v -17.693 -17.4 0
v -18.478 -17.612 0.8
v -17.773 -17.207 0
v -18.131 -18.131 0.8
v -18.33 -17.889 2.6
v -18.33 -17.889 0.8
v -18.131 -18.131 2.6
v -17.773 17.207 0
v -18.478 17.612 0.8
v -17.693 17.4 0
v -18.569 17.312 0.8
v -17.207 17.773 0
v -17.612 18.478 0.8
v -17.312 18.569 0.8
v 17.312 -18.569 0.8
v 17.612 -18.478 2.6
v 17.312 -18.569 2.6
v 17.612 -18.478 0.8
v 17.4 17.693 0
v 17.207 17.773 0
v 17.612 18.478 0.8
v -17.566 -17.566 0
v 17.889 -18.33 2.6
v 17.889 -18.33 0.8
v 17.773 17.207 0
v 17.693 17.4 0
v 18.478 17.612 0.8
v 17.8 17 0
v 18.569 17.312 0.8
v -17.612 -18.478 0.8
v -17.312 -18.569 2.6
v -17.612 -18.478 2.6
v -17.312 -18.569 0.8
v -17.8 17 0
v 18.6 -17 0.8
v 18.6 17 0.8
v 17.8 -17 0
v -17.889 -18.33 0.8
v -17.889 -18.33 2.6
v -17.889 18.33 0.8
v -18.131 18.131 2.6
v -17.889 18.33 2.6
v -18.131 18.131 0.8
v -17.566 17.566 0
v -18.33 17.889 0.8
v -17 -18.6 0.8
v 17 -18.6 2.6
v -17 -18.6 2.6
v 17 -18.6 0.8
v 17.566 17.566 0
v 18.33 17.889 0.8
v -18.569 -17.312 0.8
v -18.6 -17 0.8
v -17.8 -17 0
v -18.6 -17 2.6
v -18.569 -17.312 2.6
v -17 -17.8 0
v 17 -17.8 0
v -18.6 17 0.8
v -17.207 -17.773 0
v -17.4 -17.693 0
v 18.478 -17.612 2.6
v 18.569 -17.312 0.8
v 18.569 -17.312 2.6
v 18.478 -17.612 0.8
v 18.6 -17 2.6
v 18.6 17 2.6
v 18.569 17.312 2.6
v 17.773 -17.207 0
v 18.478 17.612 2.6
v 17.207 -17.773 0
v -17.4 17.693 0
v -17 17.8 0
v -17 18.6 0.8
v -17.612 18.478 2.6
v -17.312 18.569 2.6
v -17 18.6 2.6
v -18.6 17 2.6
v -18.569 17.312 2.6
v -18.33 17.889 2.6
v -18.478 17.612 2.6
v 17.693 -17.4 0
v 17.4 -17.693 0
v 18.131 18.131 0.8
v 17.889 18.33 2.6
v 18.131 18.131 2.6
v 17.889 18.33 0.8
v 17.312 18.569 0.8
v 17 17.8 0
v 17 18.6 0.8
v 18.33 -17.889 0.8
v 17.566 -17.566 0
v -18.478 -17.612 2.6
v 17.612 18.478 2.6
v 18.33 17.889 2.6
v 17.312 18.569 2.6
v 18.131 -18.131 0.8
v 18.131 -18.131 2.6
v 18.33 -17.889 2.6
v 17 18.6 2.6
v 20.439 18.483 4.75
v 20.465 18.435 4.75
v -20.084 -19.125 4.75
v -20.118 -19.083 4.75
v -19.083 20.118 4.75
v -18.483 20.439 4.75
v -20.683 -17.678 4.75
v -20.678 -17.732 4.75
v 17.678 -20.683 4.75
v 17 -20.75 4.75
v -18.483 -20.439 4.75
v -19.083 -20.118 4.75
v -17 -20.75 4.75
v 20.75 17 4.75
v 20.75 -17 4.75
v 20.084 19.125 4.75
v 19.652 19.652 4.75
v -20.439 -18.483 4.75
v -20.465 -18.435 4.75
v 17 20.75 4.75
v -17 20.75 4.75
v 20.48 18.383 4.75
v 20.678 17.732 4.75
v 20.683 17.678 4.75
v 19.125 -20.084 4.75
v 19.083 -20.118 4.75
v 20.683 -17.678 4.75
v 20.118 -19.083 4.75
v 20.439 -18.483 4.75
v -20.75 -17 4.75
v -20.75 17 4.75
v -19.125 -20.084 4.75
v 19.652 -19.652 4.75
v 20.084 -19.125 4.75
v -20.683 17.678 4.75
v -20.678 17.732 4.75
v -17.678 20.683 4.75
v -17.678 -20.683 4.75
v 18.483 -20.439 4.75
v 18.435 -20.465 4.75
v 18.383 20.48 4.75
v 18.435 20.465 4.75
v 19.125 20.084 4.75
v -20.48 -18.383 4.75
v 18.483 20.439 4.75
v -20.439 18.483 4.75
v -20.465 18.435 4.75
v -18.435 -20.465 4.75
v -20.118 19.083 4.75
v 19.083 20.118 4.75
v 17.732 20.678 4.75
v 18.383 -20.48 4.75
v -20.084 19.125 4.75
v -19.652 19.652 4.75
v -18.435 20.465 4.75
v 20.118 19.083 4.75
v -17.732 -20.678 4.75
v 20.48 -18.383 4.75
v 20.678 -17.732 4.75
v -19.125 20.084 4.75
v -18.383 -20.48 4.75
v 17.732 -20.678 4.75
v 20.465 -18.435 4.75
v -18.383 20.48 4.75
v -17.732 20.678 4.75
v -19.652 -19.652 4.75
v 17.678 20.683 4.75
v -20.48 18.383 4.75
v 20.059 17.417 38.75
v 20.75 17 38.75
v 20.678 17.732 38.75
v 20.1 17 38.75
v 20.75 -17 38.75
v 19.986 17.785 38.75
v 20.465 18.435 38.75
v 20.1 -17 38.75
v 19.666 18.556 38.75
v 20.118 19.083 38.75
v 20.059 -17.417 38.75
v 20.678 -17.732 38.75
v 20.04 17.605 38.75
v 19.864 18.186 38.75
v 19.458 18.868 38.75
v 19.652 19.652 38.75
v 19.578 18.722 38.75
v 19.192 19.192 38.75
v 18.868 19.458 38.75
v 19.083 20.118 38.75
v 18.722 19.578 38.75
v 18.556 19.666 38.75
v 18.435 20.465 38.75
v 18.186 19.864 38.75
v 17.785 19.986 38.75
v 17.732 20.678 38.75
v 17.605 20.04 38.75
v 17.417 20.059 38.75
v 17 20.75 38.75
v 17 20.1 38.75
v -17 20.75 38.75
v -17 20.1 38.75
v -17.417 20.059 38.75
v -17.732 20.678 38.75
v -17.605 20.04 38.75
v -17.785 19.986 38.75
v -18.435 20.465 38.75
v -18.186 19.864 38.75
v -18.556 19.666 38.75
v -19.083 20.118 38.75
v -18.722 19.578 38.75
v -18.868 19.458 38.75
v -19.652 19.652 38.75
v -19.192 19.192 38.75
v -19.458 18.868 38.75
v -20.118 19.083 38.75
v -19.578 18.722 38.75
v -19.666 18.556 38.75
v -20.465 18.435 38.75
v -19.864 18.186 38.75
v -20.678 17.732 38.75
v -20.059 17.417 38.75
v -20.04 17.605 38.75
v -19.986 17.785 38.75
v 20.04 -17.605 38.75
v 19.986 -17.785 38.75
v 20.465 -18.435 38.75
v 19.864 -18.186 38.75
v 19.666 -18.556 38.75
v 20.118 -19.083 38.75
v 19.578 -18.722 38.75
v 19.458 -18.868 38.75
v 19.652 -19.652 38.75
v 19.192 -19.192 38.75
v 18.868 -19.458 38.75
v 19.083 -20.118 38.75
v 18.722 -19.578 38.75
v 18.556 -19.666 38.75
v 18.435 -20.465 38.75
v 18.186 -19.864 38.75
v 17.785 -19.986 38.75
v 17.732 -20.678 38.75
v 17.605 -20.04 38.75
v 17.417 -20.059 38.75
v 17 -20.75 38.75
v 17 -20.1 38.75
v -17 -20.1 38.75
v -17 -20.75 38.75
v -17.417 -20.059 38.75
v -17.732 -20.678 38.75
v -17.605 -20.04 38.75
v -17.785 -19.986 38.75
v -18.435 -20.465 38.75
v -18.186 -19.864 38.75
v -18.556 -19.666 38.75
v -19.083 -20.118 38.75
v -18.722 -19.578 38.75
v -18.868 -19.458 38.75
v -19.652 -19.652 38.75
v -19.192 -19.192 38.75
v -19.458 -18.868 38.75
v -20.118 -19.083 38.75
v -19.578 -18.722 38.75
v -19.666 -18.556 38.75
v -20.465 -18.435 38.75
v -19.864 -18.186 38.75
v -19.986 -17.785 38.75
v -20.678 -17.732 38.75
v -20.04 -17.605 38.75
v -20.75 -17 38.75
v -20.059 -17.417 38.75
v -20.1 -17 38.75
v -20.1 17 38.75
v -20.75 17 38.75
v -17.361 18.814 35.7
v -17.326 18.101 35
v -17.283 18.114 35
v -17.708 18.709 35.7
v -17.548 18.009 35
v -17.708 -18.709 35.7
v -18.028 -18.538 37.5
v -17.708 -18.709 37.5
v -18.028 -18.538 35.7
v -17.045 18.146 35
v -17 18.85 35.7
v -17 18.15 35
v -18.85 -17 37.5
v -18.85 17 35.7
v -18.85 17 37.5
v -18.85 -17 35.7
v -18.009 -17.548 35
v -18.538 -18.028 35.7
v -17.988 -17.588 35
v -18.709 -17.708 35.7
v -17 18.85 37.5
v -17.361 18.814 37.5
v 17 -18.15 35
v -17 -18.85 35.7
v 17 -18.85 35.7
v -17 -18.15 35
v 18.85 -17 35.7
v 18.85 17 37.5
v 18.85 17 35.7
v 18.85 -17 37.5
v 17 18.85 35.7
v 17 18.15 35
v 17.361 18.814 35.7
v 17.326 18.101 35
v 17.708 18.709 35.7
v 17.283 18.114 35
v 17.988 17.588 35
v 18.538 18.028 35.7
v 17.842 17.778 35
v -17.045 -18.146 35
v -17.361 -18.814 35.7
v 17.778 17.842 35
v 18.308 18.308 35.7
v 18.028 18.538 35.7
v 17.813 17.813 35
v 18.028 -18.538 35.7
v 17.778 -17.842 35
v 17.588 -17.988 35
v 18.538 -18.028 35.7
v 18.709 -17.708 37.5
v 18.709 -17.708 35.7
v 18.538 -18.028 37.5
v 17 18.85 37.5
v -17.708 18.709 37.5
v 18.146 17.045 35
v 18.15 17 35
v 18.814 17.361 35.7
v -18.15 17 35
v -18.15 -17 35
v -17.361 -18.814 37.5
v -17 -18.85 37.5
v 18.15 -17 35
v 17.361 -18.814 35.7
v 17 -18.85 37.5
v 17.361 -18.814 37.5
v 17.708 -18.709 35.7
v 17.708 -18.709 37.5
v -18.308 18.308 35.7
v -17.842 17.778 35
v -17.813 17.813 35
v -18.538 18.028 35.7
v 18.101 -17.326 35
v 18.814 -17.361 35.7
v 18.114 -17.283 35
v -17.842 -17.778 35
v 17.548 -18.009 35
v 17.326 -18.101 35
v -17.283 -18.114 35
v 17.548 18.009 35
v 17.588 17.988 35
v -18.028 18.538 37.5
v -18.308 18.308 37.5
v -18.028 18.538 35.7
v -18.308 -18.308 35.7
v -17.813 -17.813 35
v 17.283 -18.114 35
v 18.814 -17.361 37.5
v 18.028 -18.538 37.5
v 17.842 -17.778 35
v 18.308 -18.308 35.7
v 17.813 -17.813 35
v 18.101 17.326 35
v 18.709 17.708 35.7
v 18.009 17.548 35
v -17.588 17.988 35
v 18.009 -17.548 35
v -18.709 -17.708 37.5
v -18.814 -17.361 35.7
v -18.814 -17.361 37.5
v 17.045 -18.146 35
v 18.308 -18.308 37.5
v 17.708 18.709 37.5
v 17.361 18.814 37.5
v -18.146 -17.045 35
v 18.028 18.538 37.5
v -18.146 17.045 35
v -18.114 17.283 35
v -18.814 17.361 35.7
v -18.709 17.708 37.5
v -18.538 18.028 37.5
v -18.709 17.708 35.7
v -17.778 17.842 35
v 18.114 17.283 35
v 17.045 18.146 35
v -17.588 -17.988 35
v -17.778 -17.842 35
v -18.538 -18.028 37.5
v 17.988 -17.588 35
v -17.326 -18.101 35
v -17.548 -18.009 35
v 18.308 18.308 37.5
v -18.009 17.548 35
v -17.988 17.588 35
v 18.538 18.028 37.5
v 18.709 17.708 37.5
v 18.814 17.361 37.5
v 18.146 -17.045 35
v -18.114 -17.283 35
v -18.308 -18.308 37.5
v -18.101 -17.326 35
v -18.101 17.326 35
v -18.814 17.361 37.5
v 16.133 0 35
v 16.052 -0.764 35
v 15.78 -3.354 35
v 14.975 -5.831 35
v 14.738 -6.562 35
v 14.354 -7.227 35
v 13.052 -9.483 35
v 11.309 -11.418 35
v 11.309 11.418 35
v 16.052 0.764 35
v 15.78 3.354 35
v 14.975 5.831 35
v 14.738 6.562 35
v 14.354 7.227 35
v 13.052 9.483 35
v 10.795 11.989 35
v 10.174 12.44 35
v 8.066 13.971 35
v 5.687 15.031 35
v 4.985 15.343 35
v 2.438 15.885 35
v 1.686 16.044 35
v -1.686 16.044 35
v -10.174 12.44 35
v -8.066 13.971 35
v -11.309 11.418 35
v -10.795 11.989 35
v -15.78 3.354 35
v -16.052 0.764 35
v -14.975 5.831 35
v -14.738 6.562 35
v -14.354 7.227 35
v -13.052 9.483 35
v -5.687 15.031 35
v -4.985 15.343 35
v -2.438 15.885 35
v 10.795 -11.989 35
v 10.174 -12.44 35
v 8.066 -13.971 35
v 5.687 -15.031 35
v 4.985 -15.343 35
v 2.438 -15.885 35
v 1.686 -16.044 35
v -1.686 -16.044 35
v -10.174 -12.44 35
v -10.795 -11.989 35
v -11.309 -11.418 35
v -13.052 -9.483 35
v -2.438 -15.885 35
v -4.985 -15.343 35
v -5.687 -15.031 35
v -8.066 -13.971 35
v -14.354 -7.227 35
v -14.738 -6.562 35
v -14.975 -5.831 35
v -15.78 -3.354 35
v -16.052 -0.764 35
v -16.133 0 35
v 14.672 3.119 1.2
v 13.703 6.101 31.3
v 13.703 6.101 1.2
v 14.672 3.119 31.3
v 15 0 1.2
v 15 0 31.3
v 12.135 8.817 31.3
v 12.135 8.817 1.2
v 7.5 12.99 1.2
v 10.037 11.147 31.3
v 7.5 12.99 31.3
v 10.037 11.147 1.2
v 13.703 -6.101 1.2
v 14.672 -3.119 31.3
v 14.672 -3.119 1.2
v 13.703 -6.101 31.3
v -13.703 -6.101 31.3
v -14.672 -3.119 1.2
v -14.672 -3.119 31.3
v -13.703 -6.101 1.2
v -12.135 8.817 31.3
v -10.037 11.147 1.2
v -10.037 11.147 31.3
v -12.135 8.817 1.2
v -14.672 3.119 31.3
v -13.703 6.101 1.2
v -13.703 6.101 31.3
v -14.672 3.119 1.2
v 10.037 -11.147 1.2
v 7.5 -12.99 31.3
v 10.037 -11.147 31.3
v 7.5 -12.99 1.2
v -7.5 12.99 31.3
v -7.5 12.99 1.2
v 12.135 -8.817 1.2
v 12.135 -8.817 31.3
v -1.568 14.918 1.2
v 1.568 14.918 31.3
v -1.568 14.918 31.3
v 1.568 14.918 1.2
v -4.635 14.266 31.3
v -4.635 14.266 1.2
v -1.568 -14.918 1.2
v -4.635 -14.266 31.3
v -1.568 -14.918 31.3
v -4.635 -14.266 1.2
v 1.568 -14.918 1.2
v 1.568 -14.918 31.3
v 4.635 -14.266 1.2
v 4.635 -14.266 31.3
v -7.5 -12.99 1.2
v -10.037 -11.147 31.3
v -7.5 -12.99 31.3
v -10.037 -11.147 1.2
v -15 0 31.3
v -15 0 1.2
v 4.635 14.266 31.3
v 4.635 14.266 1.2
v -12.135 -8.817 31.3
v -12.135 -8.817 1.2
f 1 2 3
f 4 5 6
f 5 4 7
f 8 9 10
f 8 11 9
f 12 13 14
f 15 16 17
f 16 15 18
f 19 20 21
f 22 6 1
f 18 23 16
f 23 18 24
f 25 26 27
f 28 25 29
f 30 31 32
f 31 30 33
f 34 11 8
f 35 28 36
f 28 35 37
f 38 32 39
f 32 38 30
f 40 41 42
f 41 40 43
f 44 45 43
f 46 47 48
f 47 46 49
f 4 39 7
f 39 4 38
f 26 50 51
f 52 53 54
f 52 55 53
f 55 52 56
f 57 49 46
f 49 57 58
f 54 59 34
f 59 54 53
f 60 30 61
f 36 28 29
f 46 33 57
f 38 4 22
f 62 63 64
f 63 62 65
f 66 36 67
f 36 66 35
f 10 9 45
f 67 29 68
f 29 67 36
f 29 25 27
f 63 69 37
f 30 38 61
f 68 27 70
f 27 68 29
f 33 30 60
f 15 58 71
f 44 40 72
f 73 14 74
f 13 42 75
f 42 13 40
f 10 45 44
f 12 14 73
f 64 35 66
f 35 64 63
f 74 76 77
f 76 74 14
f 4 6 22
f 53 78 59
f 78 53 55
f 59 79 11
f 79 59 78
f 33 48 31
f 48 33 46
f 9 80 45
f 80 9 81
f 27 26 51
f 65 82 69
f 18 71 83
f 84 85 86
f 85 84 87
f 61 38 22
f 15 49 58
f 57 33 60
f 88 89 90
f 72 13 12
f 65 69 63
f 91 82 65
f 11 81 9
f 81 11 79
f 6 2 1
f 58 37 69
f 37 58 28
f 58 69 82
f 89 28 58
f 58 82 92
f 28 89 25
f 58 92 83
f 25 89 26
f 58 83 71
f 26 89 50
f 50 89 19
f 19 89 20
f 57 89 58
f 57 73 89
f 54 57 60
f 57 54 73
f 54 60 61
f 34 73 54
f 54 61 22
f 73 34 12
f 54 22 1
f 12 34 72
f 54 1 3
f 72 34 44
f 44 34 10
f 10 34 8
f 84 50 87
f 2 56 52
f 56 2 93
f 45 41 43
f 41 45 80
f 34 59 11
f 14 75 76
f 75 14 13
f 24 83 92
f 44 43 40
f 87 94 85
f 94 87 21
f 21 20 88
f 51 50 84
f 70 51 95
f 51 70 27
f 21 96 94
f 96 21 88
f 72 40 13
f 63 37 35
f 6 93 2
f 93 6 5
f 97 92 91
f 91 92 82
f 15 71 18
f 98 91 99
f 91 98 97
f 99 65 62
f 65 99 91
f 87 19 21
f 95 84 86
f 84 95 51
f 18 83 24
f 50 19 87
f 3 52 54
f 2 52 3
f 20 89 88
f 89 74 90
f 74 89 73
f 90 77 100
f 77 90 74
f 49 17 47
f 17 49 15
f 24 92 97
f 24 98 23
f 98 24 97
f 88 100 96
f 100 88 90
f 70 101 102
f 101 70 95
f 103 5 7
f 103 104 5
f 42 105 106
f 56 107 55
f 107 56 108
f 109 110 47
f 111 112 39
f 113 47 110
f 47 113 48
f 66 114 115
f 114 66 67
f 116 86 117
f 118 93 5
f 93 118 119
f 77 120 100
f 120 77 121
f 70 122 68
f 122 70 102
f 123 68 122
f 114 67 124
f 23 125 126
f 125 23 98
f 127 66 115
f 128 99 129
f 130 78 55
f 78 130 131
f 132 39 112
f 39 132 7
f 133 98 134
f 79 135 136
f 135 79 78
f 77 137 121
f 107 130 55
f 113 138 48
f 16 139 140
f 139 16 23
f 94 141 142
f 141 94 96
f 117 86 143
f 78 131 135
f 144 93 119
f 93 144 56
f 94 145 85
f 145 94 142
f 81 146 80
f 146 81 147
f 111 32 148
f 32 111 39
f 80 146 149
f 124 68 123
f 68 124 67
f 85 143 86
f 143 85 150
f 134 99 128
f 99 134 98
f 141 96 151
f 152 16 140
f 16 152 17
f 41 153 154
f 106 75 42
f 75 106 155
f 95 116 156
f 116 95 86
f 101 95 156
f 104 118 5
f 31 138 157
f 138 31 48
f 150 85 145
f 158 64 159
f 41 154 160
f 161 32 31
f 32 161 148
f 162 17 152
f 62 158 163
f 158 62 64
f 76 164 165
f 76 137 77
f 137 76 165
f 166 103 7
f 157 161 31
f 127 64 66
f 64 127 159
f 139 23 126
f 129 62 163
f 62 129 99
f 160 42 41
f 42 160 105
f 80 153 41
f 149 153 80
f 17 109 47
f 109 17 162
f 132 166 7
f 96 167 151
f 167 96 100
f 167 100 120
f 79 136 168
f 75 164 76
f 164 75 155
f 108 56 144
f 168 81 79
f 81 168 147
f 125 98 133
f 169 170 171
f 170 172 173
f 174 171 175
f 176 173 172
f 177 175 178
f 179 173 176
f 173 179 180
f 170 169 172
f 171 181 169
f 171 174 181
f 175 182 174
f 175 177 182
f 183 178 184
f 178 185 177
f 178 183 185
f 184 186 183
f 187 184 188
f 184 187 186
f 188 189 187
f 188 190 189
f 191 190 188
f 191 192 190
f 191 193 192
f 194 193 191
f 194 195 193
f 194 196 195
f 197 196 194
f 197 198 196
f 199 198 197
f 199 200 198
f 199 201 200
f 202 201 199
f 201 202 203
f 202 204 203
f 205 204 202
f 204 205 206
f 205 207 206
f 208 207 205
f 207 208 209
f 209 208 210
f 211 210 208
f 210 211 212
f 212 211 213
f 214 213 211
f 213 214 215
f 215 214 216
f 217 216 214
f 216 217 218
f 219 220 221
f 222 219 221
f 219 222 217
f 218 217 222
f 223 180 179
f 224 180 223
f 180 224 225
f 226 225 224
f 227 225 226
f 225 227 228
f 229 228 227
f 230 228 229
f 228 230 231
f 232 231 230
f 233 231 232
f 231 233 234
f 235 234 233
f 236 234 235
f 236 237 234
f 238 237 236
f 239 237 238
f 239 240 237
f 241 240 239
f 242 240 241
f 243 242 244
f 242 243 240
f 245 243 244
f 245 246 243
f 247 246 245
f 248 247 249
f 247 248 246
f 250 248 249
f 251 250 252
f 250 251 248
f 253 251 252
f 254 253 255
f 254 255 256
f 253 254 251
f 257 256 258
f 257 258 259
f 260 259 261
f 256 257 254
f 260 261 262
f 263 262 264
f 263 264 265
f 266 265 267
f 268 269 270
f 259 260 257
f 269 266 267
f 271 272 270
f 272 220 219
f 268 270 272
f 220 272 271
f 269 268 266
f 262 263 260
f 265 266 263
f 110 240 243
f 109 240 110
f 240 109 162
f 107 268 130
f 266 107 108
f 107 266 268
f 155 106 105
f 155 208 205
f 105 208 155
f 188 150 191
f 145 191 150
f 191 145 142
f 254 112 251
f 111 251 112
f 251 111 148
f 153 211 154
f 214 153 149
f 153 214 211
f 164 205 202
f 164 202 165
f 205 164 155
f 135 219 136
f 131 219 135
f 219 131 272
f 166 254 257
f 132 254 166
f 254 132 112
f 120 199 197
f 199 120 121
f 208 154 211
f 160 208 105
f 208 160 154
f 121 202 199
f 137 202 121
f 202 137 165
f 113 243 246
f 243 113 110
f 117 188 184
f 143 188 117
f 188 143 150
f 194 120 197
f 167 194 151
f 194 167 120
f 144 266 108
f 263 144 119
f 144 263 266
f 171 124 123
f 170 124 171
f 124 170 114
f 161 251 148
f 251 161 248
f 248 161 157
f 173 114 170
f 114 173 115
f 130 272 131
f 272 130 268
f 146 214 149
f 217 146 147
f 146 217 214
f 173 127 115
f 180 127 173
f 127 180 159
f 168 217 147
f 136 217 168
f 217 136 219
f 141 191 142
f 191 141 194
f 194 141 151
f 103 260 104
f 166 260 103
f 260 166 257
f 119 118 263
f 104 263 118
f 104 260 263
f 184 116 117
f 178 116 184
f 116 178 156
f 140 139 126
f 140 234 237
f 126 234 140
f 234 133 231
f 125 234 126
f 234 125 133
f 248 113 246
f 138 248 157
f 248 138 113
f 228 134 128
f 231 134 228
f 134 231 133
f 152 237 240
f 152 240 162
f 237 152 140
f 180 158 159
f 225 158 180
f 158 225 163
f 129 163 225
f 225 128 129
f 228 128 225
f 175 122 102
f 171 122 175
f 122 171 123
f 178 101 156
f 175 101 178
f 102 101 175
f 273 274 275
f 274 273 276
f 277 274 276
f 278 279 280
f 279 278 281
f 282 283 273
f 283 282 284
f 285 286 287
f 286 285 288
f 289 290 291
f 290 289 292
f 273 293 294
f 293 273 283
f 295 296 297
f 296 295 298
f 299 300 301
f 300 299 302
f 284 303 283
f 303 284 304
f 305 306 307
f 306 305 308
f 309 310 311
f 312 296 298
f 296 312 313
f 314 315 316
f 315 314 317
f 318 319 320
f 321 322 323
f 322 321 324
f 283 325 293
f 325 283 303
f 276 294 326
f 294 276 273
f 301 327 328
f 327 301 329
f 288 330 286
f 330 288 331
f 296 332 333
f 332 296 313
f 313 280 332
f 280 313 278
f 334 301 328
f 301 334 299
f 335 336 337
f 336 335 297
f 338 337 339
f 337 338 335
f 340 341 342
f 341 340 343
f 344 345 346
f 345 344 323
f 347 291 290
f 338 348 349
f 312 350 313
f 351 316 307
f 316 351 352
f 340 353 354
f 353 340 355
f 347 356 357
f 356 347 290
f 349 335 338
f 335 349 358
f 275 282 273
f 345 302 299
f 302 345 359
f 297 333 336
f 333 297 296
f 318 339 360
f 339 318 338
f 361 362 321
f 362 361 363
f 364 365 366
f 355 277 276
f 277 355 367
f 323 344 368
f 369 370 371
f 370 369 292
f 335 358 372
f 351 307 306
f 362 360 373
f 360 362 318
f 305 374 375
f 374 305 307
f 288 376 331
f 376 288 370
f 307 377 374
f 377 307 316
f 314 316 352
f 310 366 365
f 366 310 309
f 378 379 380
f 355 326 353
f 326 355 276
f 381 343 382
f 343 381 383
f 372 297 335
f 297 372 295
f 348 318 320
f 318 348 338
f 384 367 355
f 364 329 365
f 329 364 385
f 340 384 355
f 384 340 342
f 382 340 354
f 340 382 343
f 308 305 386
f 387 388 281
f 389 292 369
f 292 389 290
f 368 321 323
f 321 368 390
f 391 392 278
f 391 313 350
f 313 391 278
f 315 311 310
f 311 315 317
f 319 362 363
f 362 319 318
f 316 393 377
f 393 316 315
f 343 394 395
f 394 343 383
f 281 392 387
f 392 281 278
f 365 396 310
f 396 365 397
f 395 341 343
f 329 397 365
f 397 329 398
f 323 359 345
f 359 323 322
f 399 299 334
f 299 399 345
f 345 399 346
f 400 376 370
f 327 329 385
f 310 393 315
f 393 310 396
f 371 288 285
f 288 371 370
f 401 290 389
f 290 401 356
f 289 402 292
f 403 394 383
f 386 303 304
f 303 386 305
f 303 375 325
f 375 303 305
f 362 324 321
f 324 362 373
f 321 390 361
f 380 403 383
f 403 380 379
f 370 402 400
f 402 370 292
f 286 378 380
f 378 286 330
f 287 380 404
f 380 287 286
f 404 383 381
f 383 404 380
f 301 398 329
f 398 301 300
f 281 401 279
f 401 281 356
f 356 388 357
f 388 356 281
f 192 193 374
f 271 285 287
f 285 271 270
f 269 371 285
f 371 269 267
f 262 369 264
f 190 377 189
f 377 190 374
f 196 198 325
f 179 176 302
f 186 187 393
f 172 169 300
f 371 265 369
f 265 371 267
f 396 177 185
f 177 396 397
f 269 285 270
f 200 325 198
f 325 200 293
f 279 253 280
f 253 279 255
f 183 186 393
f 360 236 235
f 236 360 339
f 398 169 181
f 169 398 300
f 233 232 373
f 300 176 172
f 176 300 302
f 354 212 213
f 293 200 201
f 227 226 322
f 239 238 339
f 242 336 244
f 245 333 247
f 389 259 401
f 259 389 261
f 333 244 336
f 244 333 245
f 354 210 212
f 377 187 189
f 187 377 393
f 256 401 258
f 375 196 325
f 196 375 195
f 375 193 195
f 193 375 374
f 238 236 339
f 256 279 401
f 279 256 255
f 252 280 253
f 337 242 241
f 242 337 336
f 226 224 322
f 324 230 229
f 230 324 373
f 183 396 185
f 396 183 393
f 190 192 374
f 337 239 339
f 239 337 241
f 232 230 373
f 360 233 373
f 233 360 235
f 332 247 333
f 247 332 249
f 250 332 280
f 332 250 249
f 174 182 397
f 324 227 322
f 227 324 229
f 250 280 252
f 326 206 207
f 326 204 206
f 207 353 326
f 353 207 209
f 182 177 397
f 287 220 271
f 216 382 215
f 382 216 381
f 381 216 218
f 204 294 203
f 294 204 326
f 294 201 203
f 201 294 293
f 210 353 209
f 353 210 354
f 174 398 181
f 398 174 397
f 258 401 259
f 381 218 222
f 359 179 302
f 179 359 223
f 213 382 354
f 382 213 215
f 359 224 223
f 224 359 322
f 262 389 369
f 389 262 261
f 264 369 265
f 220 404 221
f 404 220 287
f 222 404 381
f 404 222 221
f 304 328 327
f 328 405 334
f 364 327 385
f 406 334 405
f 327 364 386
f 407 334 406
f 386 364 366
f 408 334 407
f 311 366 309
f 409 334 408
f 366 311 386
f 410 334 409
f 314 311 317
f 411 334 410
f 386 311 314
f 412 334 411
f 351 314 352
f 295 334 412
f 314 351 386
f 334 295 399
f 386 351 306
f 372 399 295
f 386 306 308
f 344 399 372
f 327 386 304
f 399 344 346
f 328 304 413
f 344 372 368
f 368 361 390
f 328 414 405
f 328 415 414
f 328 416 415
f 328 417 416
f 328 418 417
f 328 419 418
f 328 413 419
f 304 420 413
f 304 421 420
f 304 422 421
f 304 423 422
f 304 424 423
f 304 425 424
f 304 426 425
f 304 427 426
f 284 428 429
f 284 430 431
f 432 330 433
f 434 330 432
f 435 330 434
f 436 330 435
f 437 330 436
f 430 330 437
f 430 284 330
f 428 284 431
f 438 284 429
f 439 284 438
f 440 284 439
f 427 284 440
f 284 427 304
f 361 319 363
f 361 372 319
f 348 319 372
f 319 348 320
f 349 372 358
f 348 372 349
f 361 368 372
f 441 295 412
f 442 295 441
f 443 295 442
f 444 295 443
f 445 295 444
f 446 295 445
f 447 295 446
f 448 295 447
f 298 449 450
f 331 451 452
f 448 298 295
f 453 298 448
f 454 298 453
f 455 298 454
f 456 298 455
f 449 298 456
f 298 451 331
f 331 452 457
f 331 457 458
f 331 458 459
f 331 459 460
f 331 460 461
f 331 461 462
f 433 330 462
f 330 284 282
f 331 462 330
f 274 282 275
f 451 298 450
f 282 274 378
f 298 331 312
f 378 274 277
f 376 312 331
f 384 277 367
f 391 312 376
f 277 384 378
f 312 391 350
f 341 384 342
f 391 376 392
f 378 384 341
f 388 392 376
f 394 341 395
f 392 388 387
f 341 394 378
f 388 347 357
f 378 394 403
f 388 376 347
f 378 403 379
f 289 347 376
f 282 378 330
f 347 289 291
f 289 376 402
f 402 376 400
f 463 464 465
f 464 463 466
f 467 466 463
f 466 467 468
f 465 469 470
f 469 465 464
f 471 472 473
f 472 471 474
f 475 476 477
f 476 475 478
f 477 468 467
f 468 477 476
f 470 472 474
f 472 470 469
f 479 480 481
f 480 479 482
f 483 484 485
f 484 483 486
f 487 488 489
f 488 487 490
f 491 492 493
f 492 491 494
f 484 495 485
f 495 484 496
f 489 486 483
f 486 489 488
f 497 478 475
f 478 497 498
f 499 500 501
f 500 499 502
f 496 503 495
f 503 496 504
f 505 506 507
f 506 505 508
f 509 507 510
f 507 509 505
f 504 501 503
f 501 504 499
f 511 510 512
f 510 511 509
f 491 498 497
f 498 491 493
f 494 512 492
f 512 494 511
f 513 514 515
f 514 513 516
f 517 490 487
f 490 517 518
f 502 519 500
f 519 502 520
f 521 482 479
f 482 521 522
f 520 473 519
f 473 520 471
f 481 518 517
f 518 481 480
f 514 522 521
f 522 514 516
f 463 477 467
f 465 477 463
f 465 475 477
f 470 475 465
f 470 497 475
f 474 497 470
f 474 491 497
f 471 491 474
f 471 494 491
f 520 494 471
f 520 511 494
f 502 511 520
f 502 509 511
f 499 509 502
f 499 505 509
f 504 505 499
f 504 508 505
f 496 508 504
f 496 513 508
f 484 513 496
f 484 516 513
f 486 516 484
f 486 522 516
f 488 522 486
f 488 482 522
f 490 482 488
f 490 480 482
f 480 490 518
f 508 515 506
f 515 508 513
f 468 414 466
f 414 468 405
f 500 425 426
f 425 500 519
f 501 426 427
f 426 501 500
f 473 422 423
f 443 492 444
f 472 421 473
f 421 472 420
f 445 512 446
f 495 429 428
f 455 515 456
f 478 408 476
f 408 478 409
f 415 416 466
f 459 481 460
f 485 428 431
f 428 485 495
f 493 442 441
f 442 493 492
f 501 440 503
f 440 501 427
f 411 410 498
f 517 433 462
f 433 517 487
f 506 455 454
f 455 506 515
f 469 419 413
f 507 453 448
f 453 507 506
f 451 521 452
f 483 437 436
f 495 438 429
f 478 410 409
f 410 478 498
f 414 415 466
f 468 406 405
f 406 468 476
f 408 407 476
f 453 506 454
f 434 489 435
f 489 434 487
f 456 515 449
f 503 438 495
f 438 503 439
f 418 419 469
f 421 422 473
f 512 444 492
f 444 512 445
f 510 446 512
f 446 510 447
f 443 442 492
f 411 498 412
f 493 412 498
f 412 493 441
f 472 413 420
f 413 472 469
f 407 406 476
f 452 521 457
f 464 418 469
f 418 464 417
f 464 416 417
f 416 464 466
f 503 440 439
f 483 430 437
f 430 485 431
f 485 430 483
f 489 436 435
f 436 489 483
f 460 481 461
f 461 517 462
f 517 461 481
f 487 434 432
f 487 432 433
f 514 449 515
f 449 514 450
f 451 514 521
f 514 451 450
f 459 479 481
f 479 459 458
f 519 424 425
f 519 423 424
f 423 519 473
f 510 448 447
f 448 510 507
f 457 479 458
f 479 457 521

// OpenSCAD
/* [Assembly display] */
// default preserves the original part, coupon and print selectors.
view = "default"; // [default, together, exploded]

include <gridfinity_modules.scad>

cup_height = 5;
stick_diameter = 30;
easement_z = 0.7; // a slightly large opening at the top for compliance while inserting.
minimum_wall = 4;
blocks_needed = ceil((stick_diameter+2*minimum_wall)/gridfinity_pitch);




module glue_stick_cup(num_x=1, num_y=1, num_z=2) {
  difference() {
    grid_block(num_x, num_y, num_z, magnet_diameter=0, screw_depth=0, center=true);
    glue_stick(num_z, stick_diameter);
  }
}

module glue_stick(num_z=5, diam) {
  floor_thickness = blocks_needed > 1 ? 5.5 : 1.2;
  translate([0, 0, floor_thickness]) cylinder(h=num_z*gridfinity_zpitch, d=diam);
  translate([0, 0, (num_z - easement_z)*gridfinity_zpitch + 1.2]) 
    cylinder(h=easement_z*gridfinity_zpitch, d1=diam, d2=diam*1.1);
}

// Assembly display changes placement only; the original output remains the default.
// Single printed piece: both display modes show the same intact part.
module feral_default_output_d7292064de81() {
render()
glue_stick_cup(blocks_needed, blocks_needed, cup_height);
}

module feral_assembly_view_d7292064de81(explode=false) {
feral_default_output_d7292064de81();
}

assert(view == "default" || view == "together" || view == "exploded", "Unknown assembly display");
if(view == "default") feral_default_output_d7292064de81();
else feral_assembly_view_d7292064de81(view == "exploded");
